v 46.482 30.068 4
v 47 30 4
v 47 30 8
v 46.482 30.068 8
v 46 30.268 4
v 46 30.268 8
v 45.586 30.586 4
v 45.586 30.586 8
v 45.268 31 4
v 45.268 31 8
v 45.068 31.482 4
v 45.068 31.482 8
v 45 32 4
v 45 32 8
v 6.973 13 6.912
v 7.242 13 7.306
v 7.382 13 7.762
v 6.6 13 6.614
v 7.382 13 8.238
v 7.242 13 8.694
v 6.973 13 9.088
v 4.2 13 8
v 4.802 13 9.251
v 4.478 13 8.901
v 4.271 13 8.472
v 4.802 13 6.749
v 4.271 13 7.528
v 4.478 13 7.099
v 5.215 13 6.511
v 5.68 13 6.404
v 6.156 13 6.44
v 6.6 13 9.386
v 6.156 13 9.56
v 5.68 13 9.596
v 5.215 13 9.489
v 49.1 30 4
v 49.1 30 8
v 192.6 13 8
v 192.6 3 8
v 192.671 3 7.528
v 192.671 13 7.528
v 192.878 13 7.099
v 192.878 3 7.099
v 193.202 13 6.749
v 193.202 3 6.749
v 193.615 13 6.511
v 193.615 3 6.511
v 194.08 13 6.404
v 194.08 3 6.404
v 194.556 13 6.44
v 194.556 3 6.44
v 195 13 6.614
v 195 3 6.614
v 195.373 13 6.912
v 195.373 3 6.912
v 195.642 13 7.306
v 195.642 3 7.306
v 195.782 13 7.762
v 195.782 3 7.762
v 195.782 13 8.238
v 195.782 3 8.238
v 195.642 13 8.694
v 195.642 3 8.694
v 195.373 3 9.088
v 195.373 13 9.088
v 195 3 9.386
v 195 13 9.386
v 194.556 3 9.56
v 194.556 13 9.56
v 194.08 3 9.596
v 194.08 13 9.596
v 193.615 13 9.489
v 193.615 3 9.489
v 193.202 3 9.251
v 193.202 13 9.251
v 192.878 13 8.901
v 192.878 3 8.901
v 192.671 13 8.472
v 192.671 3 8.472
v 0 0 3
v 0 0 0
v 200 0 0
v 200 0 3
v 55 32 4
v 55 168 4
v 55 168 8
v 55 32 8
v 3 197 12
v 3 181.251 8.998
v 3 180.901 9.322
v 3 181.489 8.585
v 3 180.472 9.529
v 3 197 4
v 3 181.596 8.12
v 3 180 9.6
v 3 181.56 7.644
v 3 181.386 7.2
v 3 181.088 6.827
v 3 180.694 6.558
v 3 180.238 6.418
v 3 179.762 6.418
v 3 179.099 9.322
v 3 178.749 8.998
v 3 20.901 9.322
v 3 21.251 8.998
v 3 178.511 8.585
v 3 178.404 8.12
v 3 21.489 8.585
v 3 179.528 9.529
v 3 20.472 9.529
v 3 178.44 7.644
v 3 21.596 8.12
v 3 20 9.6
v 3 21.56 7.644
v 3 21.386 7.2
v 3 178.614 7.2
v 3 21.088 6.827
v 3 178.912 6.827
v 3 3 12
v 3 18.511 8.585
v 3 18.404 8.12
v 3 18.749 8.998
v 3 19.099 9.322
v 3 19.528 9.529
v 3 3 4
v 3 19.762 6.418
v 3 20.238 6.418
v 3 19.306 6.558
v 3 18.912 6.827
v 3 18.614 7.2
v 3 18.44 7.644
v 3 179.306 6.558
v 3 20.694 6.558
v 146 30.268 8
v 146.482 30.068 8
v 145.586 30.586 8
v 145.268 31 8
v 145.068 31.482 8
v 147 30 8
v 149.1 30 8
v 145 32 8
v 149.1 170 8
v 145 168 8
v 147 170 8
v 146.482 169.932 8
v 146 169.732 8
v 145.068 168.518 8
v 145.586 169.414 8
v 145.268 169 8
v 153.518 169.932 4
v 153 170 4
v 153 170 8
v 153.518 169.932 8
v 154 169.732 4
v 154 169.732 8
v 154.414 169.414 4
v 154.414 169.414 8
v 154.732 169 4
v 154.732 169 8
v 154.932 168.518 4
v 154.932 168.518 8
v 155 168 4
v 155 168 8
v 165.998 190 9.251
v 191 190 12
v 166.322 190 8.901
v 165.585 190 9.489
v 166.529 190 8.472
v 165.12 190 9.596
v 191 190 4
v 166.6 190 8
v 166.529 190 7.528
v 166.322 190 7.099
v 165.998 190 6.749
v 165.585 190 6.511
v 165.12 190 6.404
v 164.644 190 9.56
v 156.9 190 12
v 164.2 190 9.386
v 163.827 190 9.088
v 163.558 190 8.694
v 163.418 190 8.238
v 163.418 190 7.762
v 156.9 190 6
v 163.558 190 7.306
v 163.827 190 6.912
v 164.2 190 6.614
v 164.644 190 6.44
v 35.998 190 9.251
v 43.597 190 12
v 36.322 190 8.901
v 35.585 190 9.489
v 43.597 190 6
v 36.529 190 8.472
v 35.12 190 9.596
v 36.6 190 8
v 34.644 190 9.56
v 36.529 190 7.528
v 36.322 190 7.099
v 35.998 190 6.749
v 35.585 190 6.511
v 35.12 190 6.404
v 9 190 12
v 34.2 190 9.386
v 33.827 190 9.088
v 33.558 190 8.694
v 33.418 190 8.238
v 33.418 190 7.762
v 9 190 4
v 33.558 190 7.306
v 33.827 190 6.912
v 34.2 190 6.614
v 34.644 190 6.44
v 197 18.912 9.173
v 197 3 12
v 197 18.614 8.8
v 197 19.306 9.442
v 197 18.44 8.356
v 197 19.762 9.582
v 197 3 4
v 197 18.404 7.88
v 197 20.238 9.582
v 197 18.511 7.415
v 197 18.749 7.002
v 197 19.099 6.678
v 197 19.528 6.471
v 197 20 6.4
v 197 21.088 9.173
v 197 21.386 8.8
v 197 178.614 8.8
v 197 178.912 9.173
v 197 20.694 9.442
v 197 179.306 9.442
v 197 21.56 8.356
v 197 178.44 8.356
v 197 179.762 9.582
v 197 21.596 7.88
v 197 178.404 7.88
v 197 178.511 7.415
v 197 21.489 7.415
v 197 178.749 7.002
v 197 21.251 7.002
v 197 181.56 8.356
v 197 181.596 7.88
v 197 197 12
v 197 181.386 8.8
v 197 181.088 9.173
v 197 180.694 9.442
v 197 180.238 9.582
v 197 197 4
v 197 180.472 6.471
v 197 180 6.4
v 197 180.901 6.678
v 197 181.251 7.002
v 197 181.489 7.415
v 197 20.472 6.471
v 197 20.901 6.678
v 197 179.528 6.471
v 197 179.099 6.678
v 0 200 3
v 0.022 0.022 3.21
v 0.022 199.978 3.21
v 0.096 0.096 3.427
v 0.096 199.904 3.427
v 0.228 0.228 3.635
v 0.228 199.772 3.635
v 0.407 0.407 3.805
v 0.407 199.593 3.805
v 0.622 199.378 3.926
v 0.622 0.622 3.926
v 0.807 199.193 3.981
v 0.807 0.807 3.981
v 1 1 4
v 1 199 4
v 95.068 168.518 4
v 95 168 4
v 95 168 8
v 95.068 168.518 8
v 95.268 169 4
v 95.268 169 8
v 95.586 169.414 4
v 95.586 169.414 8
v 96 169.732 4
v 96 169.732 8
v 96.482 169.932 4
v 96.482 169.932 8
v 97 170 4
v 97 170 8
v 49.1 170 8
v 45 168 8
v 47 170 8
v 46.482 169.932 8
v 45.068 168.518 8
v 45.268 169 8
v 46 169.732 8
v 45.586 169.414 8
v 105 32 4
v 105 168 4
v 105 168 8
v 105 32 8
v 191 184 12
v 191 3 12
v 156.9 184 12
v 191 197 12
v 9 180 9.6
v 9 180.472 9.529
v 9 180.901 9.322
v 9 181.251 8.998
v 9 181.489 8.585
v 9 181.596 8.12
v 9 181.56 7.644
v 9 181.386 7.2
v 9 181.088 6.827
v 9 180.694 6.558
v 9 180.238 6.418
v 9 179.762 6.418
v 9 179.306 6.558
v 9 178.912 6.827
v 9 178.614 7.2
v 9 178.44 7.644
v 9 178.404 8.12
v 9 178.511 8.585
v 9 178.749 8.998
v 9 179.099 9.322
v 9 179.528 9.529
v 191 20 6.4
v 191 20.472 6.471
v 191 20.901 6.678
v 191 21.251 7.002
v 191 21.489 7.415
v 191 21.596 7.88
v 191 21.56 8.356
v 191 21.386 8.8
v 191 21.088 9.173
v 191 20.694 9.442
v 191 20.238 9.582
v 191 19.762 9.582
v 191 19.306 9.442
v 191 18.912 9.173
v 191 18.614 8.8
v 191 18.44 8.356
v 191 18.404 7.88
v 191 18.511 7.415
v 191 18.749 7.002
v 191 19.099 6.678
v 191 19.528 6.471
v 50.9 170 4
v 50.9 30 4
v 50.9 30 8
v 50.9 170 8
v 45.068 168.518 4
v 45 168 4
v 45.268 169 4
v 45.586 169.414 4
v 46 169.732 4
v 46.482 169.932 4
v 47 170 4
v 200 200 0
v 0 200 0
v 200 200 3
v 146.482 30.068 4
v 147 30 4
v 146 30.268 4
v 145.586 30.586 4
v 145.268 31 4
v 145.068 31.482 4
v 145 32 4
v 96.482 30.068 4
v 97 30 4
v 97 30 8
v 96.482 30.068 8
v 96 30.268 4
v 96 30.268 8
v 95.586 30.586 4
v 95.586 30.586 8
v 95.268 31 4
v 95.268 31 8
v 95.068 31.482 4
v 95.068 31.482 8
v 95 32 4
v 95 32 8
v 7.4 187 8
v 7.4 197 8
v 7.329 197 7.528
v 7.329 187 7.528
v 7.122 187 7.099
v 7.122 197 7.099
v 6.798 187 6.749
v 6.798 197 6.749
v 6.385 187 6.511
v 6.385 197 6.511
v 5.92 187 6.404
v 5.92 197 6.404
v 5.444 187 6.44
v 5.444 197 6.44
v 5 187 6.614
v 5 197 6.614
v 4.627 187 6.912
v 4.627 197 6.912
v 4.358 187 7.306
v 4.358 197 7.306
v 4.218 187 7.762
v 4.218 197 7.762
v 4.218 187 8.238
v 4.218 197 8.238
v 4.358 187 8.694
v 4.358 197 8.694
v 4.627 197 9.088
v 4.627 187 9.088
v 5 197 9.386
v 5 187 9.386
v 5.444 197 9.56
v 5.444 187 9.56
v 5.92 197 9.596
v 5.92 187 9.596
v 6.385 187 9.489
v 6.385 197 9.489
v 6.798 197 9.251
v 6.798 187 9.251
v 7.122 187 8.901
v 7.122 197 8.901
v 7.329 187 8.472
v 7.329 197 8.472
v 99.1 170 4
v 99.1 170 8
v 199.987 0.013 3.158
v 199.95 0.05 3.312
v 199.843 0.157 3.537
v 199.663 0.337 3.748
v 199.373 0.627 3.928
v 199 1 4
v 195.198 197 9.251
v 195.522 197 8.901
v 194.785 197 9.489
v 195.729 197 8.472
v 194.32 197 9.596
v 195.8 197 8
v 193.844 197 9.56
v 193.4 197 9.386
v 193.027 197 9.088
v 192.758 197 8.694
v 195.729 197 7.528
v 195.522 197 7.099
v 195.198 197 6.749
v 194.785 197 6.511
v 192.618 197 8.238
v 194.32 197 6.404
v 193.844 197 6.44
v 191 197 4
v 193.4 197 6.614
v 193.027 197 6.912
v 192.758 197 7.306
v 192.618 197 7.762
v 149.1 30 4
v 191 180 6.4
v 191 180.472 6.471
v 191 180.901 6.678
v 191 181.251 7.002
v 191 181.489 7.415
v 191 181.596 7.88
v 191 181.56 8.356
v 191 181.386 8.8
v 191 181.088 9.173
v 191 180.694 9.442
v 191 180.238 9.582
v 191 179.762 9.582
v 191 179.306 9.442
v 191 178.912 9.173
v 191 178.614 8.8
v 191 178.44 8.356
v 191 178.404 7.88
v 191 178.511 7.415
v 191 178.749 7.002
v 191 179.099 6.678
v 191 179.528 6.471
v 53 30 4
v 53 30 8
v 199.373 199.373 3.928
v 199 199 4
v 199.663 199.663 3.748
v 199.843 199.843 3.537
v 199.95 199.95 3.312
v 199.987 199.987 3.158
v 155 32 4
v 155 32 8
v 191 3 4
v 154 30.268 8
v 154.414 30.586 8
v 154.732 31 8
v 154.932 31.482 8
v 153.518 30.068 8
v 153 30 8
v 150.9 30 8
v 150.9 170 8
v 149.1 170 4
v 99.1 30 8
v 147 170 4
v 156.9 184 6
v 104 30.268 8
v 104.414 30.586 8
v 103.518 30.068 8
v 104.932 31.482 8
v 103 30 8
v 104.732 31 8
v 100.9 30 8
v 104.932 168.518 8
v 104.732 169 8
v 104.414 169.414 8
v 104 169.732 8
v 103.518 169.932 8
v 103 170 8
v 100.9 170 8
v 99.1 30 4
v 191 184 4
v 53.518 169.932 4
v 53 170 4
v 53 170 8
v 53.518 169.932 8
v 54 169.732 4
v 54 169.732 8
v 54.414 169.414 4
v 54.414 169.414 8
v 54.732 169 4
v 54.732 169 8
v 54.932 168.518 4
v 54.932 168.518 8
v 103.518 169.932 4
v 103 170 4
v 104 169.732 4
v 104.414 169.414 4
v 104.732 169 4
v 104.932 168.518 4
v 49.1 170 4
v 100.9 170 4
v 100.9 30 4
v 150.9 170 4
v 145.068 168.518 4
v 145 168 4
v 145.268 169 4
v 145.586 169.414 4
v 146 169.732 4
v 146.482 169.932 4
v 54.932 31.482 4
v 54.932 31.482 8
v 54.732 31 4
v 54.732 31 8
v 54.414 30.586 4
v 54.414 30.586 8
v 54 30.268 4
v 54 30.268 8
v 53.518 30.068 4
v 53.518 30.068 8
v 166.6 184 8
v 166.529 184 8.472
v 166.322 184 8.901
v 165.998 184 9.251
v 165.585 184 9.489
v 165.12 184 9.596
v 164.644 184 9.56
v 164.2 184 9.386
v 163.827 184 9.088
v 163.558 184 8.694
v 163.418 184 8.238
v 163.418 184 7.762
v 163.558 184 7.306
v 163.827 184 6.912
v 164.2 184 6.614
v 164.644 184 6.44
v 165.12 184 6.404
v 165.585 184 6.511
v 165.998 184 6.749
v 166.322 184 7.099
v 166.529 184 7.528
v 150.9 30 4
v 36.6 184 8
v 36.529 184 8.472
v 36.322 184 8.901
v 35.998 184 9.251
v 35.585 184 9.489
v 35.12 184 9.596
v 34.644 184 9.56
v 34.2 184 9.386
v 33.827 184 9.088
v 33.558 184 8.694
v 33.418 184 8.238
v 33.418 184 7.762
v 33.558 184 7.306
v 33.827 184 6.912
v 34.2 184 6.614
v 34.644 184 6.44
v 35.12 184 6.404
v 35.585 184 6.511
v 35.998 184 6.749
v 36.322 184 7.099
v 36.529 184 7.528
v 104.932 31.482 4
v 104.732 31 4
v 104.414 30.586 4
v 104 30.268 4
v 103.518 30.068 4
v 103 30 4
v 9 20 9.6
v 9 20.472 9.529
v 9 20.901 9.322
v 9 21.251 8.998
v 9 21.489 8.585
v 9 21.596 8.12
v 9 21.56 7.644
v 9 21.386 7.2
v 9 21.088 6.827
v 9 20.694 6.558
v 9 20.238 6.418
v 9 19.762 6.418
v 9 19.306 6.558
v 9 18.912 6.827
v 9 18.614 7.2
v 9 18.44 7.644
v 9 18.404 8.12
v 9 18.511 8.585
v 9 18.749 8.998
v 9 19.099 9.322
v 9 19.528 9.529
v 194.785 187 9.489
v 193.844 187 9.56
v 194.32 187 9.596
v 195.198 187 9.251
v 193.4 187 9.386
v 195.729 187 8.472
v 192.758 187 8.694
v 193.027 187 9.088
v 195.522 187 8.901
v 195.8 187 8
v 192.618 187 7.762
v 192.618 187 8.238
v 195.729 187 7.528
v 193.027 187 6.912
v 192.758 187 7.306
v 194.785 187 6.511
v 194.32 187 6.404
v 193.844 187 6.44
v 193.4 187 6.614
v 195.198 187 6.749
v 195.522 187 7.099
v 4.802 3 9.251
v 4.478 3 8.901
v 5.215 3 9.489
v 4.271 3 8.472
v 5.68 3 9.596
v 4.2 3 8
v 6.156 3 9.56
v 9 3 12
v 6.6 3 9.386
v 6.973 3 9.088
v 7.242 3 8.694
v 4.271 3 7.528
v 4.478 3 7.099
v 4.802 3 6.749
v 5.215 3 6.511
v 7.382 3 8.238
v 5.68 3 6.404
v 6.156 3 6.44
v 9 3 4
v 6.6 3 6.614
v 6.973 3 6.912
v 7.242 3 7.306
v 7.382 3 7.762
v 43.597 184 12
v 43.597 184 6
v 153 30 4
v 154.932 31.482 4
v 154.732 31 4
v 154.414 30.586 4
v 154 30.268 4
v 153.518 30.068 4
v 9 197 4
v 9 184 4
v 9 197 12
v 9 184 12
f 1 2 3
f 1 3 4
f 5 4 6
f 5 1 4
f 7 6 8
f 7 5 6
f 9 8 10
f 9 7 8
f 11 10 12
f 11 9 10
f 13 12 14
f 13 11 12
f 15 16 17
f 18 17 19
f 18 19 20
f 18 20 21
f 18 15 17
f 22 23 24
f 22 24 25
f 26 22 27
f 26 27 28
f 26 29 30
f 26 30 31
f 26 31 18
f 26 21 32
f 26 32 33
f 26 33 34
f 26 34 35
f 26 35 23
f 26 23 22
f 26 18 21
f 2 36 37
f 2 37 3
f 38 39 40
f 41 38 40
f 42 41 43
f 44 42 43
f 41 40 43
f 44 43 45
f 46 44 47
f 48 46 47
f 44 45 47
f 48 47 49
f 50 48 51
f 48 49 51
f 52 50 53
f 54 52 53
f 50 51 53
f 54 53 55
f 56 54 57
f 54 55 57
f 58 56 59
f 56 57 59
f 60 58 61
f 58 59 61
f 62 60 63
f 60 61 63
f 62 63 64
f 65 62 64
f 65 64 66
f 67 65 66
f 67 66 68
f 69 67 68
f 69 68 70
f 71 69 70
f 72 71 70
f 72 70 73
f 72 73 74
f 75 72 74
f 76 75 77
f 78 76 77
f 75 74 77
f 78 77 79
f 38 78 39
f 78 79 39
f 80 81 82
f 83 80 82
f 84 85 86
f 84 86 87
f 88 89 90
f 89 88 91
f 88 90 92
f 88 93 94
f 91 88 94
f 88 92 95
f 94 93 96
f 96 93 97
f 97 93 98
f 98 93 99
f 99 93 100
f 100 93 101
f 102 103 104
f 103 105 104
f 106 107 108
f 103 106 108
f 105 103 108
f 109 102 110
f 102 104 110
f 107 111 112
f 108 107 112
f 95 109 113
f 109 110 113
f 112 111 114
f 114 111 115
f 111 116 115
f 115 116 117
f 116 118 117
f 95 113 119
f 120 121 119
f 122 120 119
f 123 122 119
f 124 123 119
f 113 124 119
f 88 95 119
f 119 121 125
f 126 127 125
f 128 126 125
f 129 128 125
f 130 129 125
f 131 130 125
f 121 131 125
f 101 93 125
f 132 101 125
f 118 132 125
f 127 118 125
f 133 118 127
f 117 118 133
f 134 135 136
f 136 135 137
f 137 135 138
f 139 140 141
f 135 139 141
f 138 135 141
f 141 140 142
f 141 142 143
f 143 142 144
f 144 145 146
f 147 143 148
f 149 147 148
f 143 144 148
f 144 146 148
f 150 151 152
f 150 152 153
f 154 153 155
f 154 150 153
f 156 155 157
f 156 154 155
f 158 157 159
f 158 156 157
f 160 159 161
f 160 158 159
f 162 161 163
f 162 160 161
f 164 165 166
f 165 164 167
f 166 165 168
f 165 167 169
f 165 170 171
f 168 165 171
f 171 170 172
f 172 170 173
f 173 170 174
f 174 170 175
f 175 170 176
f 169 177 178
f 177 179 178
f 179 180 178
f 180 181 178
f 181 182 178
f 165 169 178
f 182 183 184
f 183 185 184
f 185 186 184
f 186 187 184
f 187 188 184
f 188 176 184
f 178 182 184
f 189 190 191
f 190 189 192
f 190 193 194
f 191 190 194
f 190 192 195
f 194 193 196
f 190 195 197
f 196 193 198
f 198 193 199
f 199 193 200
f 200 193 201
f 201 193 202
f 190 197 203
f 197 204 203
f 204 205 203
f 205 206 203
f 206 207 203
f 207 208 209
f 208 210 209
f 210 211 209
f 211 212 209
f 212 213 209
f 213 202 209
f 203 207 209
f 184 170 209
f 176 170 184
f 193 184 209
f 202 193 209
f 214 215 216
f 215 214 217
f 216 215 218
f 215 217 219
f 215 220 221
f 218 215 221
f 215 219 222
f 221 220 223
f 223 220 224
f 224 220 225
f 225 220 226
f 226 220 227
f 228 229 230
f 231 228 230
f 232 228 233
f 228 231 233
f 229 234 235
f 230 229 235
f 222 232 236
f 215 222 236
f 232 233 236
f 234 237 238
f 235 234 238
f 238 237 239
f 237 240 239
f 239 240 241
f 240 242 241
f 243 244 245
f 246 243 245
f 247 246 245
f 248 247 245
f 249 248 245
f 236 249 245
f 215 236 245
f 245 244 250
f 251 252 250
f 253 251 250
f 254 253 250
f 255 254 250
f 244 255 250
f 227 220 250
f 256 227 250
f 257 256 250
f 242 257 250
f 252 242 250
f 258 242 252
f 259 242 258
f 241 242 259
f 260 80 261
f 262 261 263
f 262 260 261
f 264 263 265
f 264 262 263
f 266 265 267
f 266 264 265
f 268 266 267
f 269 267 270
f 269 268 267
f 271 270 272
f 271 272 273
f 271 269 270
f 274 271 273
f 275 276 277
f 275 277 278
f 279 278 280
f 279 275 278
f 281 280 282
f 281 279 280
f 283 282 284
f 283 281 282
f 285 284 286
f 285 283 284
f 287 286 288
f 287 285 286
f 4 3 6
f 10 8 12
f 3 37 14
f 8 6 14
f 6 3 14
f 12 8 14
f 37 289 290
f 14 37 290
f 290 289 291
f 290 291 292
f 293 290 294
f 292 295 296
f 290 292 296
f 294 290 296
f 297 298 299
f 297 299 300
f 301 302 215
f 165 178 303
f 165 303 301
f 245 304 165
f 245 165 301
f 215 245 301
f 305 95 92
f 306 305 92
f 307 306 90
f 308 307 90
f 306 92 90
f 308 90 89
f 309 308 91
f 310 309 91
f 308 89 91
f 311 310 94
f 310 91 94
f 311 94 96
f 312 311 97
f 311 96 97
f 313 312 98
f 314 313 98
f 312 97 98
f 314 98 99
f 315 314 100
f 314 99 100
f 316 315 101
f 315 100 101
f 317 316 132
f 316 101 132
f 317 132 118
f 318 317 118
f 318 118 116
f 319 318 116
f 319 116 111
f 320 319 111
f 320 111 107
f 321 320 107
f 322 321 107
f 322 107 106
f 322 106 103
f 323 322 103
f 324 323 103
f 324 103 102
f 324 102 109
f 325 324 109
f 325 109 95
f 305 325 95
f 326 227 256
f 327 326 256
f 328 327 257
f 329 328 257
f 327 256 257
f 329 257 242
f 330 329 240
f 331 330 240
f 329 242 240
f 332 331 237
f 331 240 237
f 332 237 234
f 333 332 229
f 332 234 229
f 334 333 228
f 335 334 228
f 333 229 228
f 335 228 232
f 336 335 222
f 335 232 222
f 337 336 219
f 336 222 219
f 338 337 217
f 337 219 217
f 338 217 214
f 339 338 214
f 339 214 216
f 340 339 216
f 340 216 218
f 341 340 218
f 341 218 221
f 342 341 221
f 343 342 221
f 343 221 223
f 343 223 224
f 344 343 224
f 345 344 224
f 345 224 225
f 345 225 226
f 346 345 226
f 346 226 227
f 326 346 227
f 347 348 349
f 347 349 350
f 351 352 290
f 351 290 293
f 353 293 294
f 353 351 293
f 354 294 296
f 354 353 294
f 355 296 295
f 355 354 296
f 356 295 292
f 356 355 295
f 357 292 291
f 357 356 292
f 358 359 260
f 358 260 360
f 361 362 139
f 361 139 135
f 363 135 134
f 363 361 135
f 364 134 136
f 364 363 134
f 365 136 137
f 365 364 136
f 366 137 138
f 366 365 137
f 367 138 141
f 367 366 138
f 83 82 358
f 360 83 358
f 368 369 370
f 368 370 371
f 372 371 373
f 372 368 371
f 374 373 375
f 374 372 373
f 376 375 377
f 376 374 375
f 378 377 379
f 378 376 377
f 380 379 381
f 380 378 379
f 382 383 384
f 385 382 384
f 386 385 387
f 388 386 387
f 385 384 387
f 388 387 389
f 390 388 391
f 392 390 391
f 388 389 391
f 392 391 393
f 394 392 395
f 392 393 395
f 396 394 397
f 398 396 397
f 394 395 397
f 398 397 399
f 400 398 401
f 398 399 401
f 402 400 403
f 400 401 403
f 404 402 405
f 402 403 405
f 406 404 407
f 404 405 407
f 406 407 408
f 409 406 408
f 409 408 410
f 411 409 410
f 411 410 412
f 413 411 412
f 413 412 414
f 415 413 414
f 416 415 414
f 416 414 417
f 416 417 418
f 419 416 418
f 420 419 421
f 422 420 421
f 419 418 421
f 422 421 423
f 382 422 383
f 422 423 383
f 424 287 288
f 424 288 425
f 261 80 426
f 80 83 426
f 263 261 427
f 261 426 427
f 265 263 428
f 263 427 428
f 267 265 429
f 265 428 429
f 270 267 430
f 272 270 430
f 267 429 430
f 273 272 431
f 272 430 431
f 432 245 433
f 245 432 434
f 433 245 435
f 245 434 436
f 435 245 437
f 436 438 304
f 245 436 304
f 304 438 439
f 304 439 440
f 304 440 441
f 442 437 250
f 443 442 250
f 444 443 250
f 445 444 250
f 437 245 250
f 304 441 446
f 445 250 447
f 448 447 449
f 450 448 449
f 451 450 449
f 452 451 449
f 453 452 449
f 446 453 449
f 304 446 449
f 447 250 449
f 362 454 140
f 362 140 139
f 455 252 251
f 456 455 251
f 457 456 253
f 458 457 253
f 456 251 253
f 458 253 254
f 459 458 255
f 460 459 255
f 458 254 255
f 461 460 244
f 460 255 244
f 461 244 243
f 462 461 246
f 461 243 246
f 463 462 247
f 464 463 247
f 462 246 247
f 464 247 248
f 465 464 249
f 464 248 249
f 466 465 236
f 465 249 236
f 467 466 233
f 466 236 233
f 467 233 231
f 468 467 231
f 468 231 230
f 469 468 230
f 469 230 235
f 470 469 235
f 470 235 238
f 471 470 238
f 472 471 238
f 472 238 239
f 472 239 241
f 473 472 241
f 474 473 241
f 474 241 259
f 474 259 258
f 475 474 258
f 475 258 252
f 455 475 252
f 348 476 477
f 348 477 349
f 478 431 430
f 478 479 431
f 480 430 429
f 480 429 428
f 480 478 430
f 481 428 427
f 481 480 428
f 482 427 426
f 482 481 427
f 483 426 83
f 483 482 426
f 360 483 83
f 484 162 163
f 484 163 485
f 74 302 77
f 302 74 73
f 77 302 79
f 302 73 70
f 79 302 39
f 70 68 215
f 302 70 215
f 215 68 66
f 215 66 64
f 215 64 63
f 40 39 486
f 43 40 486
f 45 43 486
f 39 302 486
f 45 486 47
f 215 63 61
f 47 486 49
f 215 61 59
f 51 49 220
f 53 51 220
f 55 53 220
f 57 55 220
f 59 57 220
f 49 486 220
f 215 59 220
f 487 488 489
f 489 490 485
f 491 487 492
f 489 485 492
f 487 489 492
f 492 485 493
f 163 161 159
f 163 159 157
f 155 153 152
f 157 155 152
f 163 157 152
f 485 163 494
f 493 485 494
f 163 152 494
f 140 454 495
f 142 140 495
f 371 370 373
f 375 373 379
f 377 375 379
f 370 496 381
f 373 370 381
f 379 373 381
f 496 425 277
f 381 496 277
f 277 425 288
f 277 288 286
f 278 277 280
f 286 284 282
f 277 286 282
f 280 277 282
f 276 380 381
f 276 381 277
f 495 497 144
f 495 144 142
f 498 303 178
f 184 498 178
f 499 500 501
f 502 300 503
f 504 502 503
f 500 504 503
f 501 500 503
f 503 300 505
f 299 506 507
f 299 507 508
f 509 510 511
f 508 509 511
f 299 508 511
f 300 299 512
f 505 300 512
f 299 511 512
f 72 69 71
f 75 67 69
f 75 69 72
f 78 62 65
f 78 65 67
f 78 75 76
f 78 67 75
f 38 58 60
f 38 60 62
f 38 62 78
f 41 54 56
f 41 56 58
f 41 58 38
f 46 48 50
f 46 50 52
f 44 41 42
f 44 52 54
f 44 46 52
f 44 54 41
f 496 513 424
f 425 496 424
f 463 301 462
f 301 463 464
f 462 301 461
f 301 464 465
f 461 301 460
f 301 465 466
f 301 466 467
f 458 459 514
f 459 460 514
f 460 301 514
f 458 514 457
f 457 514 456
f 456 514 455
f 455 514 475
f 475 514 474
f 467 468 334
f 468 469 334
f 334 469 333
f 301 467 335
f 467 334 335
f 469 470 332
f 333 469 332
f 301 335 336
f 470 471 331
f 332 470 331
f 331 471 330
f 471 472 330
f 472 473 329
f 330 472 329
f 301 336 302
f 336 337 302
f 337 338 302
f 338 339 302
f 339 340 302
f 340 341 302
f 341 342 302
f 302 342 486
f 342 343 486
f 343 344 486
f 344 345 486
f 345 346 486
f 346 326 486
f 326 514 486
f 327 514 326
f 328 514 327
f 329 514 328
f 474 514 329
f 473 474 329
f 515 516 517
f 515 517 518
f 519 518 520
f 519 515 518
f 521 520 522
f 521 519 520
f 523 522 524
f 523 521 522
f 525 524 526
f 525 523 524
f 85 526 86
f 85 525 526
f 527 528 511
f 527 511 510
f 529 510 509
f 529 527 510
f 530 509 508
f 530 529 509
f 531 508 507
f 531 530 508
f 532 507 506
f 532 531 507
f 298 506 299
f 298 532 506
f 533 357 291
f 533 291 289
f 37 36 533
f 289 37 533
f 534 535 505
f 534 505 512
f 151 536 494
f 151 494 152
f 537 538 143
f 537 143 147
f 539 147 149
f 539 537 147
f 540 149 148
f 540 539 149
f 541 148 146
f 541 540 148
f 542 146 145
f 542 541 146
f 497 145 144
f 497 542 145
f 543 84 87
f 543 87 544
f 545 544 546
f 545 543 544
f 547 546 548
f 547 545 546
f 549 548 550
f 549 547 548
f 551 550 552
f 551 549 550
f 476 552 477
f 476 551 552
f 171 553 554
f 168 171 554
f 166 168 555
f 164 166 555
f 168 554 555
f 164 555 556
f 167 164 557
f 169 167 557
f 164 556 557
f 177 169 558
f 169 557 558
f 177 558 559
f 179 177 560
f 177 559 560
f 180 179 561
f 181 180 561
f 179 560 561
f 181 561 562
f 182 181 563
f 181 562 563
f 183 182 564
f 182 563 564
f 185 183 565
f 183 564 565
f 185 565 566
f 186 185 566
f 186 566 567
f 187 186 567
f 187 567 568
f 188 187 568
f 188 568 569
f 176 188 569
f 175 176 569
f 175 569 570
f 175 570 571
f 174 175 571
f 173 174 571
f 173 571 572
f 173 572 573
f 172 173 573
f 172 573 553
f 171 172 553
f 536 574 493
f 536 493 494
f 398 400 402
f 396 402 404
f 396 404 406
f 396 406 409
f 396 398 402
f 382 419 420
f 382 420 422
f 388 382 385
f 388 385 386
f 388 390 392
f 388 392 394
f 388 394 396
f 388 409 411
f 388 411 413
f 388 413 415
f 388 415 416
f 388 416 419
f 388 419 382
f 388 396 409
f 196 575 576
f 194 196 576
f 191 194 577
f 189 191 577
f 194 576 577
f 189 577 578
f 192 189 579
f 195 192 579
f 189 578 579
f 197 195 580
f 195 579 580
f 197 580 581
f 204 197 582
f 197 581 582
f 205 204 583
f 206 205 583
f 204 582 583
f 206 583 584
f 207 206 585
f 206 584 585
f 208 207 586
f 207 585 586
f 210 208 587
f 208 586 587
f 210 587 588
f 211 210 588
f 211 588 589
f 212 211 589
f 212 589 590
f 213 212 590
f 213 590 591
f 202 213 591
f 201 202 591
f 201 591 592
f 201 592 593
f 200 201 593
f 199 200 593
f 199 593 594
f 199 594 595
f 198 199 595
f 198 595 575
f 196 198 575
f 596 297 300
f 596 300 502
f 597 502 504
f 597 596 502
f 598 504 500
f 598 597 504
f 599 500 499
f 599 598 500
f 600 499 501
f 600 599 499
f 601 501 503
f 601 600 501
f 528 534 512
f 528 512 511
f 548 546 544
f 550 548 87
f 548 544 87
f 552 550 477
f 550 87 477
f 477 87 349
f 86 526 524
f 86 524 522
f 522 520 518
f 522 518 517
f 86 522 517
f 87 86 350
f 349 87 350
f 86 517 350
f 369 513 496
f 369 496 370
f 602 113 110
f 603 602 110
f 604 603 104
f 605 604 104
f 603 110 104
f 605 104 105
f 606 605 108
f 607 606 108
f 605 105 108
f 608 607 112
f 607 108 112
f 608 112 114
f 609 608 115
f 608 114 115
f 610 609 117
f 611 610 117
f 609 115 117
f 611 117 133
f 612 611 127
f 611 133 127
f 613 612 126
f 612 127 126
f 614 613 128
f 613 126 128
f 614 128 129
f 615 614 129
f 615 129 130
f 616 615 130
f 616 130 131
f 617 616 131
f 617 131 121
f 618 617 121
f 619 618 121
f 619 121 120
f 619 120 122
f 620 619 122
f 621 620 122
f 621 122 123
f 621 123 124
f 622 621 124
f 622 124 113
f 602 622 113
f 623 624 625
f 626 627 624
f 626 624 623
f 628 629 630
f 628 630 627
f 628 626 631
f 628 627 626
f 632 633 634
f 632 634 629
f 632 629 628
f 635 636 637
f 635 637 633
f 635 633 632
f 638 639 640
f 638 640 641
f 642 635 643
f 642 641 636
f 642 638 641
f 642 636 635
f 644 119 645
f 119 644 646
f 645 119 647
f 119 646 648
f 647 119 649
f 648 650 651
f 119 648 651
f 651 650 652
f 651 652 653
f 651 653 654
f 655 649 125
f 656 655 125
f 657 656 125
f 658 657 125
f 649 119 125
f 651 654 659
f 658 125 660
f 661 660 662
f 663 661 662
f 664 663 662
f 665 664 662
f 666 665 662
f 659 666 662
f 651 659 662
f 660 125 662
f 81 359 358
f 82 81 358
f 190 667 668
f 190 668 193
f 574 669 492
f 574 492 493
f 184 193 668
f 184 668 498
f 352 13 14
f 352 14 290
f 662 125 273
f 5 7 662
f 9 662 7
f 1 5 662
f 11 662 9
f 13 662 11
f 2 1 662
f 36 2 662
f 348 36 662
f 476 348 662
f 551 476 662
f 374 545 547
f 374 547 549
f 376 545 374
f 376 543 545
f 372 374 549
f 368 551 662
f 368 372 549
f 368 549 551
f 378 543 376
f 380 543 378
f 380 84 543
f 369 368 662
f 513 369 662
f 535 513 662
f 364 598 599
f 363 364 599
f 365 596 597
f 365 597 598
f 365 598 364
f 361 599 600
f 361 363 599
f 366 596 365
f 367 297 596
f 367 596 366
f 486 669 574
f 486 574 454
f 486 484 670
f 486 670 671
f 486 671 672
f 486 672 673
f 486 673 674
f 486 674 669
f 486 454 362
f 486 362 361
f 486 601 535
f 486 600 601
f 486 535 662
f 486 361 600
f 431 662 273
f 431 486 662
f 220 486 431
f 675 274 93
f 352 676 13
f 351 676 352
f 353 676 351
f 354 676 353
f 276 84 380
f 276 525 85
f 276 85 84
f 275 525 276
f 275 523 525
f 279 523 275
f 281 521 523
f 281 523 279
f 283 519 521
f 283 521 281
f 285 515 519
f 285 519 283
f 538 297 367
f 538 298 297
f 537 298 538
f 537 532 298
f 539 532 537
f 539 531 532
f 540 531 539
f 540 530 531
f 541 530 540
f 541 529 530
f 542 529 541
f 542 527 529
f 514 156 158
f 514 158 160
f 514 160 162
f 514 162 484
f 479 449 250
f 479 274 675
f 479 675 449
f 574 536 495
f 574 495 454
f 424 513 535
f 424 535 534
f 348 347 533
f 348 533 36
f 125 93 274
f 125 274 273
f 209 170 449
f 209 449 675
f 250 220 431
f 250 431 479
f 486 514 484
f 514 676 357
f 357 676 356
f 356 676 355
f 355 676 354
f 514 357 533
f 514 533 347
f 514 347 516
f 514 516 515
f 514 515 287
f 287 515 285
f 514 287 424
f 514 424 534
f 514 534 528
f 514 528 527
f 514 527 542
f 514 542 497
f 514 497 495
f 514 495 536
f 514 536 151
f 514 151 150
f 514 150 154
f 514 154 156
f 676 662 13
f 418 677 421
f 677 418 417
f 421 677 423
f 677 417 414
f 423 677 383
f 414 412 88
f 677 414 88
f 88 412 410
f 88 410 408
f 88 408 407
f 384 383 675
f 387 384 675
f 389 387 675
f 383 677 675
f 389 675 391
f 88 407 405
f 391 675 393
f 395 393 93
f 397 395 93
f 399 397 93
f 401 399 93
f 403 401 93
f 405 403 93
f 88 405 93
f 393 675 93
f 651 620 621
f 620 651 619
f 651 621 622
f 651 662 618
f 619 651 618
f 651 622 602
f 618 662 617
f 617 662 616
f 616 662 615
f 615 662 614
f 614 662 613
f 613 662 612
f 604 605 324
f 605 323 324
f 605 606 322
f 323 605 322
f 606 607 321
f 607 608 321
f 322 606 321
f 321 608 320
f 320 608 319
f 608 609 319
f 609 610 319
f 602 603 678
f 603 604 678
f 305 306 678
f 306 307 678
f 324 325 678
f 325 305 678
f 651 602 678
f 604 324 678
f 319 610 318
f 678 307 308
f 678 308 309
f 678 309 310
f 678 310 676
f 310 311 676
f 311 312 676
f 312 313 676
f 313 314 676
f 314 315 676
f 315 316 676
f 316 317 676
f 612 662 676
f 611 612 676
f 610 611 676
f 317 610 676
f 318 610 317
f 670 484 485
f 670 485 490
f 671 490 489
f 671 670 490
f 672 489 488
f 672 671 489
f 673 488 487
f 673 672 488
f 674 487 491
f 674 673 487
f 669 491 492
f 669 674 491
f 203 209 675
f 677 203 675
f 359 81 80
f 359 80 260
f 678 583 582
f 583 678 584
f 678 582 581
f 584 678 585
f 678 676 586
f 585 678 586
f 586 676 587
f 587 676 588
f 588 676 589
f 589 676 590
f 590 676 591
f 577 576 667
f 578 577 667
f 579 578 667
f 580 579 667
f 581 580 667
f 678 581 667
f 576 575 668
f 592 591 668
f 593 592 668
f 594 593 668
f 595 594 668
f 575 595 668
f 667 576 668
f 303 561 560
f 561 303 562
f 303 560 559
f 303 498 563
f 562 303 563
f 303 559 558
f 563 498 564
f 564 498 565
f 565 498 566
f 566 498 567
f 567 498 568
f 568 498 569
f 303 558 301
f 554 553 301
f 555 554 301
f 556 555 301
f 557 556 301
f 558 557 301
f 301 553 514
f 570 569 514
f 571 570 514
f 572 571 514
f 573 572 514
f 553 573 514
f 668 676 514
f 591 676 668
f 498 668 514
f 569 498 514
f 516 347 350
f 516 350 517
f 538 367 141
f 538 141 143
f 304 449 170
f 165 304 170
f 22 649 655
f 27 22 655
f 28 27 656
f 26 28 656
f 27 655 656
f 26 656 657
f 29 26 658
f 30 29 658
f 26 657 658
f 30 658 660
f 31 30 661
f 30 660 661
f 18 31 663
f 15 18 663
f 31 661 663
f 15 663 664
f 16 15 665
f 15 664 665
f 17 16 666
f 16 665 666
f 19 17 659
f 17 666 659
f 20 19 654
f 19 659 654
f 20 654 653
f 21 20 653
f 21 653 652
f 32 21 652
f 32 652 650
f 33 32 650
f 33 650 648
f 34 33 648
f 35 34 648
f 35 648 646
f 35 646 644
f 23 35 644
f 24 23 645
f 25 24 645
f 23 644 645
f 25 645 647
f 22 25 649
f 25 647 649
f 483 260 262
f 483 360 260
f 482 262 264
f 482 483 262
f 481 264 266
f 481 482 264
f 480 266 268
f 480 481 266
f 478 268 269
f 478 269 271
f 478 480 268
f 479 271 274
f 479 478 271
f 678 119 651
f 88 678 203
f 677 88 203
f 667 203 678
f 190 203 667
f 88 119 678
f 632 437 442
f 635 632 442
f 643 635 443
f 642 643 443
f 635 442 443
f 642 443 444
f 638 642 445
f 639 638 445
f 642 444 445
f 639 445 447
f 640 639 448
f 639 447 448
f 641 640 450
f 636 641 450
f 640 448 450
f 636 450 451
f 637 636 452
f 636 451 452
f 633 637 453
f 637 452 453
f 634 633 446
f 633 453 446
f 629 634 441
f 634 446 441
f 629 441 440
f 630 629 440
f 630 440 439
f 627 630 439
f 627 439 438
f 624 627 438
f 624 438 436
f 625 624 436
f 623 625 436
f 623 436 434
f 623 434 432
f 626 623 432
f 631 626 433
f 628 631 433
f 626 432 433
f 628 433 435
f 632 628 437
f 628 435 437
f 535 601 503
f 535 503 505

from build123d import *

# Parameters (mm, degrees)
ESQUISSE1_W                 = 200
ESQUISSE1_H                 = 200
BOSS_EXTRU_PAROIE_DEPTH     = 4
BOSS_EXTRU_BORDS_DEPTH      = 8
BOSS_EXTRU_GLISSIERES_DEPTH = 4
CONG_1_R                    = 1
ESQUISSE8_W                 = 1.8
ESQUISSE8_H                 = 180
ENL_V_MAT_EXTRU_6_DEPTH     = 9
ESQUISSE5_R                 = 1.6
ENL_V_MAT_EXTRU_2_DEPTH     = 10
ESQUISSE6_R                 = 1.6
ENL_V_MAT_EXTRU_3_DEPTH     = 10
ESQUISSE7_R                 = 1.6
ENL_V_MAT_EXTRU_4_DEPTH     = 10
ESQUISSE10_R                = 1.6
ENL_V_MAT_EXTRU_8_DEPTH     = 10
ESQUISSE11_W                = 113.303164178
ESQUISSE11_H                = 6
ENL_V_MAT_EXTRU_9_DEPTH     = 6
ESQUISSE9_R                 = 1.6
ENL_V_MAT_EXTRU_10_DEPTH    = 10


with BuildPart() as part:
    # Esquisse1 → Boss.-Extru. Paroie (new body)
    with BuildSketch(Plane.XY):
        with Locations((100, 100)):
            Rectangle(ESQUISSE1_W, ESQUISSE1_H)
    extrude(amount=BOSS_EXTRU_PAROIE_DEPTH)

    # Esquisse4 → Boss.-Extru. Bords (add)
    with BuildSketch(Plane.XY.offset(4)):
        Polygon((3, 3), (9, 3), (9, 184), (191, 184), (191, 3), (197, 3), (197, 197), (191, 197), (191, 190), (9, 190), (9, 197), (3, 197), align=None)
    extrude(amount=BOSS_EXTRU_BORDS_DEPTH)

    # Esquisse2 → Boss.-Extru. Glissieres (add)
    with BuildSketch(Plane.XY.offset(4)):
        with BuildLine():
            Line((47, 170), (53, 170))
            ThreePointArc((53, 170), (54.414213562, 169.414213562), (55, 168))
            Line((55, 168), (55, 32))
            ThreePointArc((55, 32), (54.414213562, 30.585786438), (53, 30))
            Line((53, 30), (47, 30))
            ThreePointArc((47, 30), (45.585786438, 30.585786438), (45, 32))
            Line((45, 32), (45, 168))
            ThreePointArc((45, 168), (45.585786438, 169.414213562), (47, 170))
        make_face()
        with BuildLine():
            Line((97, 170), (103, 170))
            ThreePointArc((103, 170), (104.414213562, 169.414213562), (105, 168))
            Line((105, 168), (105, 32))
            ThreePointArc((105, 32), (104.414213562, 30.585786438), (103, 30))
            Line((103, 30), (97, 30))
            ThreePointArc((97, 30), (95.585786438, 30.585786438), (95, 32))
            Line((95, 32), (95, 168))
            ThreePointArc((95, 168), (95.585786438, 169.414213562), (97, 170))
        make_face()
        with BuildLine():
            Line((147, 170), (153, 170))
            ThreePointArc((153, 170), (154.414213562, 169.414213562), (155, 168))
            Line((155, 168), (155, 32))
            ThreePointArc((155, 32), (154.414213562, 30.585786438), (153, 30))
            Line((153, 30), (147, 30))
            ThreePointArc((147, 30), (145.585786438, 30.585786438), (145, 32))
            Line((145, 32), (145, 168))
            ThreePointArc((145, 168), (145.585786438, 169.414213562), (147, 170))
        make_face()
    extrude(amount=BOSS_EXTRU_GLISSIERES_DEPTH)

    # Congé1
    cong_1_edges = [part.edges().sort_by_distance(p)[0] for p in [
        (200, 100, 4),
        (100, 200, 4),
        (0, 100, 4),
        (100, 0, 4),
    ]]
    fillet(cong_1_edges, radius=CONG_1_R)

    # Esquisse8 → Enlèv. mat.-Extru.6 (cut, through all)
    with BuildSketch(Plane.XY.offset(4)):
        with Locations((100, 85)):
            Rectangle(ESQUISSE8_W, ESQUISSE8_H)
        with Locations((150, 85)):
            Rectangle(ESQUISSE8_W, ESQUISSE8_H)
        with Locations((50, 85)):
            Rectangle(ESQUISSE8_W, ESQUISSE8_H)
    extrude(amount=ENL_V_MAT_EXTRU_6_DEPTH, mode=Mode.SUBTRACT)

    # Esquisse5 → Enlèv. mat.-Extru.2 (cut)
    with BuildSketch(Plane.ZY.offset(-3)):
        with Locations((8, 180)):
            Circle(ESQUISSE5_R)
        with Locations((8, 20)):
            Circle(ESQUISSE5_R)
    extrude(amount=-ENL_V_MAT_EXTRU_2_DEPTH, mode=Mode.SUBTRACT)

    # Esquisse6 → Enlèv. mat.-Extru.3 (cut)
    with BuildSketch(Plane(origin=(197, 0, 0), x_dir=(0, 0, -1), z_dir=(1, 0, 0))):
        with Locations((-8, 180)):
            Circle(ESQUISSE6_R)
        with Locations((-8, 20)):
            Circle(ESQUISSE6_R)
    extrude(amount=-ENL_V_MAT_EXTRU_3_DEPTH, mode=Mode.SUBTRACT)

    # Esquisse7 → Enlèv. mat.-Extru.4 (cut)
    with BuildSketch(Plane.XZ.offset(-184)):
        with Locations((35, 8)):
            Circle(ESQUISSE7_R)
        with Locations((165, 8)):
            Circle(ESQUISSE7_R)
    extrude(amount=-ENL_V_MAT_EXTRU_4_DEPTH, mode=Mode.SUBTRACT)

    # Esquisse10 → Enlèv. mat.-Extru.8 (cut)
    with BuildSketch(Plane(origin=(0, 3, 0), x_dir=(-1, 0, 0), z_dir=(0, -1, 0))):
        with Locations((-194.2, -8)):
            Circle(ESQUISSE10_R)
        with Locations((-5.8, -8)):
            Circle(ESQUISSE10_R)
    extrude(amount=-ENL_V_MAT_EXTRU_8_DEPTH, mode=Mode.SUBTRACT)

    # Esquisse11 → Enlèv. mat.-Extru.9 (cut)
    with BuildSketch(Plane.XY.offset(12)):
        with Locations((100.248809194, 187)):
            Rectangle(ESQUISSE11_W, ESQUISSE11_H)
    extrude(amount=-ENL_V_MAT_EXTRU_9_DEPTH, mode=Mode.SUBTRACT)

    # Esquisse9 → Enlèv. mat.-Extru.10 (cut)
    with BuildSketch(Plane(origin=(0, 197, 0), x_dir=(1, 0, 0), z_dir=(0, 1, 0))):
        with Locations((194.2, -8)):
            Circle(ESQUISSE9_R)
        with Locations((5.8, -8)):
            Circle(ESQUISSE9_R)
    extrude(amount=-ENL_V_MAT_EXTRU_10_DEPTH, mode=Mode.SUBTRACT)


solid = part.part
